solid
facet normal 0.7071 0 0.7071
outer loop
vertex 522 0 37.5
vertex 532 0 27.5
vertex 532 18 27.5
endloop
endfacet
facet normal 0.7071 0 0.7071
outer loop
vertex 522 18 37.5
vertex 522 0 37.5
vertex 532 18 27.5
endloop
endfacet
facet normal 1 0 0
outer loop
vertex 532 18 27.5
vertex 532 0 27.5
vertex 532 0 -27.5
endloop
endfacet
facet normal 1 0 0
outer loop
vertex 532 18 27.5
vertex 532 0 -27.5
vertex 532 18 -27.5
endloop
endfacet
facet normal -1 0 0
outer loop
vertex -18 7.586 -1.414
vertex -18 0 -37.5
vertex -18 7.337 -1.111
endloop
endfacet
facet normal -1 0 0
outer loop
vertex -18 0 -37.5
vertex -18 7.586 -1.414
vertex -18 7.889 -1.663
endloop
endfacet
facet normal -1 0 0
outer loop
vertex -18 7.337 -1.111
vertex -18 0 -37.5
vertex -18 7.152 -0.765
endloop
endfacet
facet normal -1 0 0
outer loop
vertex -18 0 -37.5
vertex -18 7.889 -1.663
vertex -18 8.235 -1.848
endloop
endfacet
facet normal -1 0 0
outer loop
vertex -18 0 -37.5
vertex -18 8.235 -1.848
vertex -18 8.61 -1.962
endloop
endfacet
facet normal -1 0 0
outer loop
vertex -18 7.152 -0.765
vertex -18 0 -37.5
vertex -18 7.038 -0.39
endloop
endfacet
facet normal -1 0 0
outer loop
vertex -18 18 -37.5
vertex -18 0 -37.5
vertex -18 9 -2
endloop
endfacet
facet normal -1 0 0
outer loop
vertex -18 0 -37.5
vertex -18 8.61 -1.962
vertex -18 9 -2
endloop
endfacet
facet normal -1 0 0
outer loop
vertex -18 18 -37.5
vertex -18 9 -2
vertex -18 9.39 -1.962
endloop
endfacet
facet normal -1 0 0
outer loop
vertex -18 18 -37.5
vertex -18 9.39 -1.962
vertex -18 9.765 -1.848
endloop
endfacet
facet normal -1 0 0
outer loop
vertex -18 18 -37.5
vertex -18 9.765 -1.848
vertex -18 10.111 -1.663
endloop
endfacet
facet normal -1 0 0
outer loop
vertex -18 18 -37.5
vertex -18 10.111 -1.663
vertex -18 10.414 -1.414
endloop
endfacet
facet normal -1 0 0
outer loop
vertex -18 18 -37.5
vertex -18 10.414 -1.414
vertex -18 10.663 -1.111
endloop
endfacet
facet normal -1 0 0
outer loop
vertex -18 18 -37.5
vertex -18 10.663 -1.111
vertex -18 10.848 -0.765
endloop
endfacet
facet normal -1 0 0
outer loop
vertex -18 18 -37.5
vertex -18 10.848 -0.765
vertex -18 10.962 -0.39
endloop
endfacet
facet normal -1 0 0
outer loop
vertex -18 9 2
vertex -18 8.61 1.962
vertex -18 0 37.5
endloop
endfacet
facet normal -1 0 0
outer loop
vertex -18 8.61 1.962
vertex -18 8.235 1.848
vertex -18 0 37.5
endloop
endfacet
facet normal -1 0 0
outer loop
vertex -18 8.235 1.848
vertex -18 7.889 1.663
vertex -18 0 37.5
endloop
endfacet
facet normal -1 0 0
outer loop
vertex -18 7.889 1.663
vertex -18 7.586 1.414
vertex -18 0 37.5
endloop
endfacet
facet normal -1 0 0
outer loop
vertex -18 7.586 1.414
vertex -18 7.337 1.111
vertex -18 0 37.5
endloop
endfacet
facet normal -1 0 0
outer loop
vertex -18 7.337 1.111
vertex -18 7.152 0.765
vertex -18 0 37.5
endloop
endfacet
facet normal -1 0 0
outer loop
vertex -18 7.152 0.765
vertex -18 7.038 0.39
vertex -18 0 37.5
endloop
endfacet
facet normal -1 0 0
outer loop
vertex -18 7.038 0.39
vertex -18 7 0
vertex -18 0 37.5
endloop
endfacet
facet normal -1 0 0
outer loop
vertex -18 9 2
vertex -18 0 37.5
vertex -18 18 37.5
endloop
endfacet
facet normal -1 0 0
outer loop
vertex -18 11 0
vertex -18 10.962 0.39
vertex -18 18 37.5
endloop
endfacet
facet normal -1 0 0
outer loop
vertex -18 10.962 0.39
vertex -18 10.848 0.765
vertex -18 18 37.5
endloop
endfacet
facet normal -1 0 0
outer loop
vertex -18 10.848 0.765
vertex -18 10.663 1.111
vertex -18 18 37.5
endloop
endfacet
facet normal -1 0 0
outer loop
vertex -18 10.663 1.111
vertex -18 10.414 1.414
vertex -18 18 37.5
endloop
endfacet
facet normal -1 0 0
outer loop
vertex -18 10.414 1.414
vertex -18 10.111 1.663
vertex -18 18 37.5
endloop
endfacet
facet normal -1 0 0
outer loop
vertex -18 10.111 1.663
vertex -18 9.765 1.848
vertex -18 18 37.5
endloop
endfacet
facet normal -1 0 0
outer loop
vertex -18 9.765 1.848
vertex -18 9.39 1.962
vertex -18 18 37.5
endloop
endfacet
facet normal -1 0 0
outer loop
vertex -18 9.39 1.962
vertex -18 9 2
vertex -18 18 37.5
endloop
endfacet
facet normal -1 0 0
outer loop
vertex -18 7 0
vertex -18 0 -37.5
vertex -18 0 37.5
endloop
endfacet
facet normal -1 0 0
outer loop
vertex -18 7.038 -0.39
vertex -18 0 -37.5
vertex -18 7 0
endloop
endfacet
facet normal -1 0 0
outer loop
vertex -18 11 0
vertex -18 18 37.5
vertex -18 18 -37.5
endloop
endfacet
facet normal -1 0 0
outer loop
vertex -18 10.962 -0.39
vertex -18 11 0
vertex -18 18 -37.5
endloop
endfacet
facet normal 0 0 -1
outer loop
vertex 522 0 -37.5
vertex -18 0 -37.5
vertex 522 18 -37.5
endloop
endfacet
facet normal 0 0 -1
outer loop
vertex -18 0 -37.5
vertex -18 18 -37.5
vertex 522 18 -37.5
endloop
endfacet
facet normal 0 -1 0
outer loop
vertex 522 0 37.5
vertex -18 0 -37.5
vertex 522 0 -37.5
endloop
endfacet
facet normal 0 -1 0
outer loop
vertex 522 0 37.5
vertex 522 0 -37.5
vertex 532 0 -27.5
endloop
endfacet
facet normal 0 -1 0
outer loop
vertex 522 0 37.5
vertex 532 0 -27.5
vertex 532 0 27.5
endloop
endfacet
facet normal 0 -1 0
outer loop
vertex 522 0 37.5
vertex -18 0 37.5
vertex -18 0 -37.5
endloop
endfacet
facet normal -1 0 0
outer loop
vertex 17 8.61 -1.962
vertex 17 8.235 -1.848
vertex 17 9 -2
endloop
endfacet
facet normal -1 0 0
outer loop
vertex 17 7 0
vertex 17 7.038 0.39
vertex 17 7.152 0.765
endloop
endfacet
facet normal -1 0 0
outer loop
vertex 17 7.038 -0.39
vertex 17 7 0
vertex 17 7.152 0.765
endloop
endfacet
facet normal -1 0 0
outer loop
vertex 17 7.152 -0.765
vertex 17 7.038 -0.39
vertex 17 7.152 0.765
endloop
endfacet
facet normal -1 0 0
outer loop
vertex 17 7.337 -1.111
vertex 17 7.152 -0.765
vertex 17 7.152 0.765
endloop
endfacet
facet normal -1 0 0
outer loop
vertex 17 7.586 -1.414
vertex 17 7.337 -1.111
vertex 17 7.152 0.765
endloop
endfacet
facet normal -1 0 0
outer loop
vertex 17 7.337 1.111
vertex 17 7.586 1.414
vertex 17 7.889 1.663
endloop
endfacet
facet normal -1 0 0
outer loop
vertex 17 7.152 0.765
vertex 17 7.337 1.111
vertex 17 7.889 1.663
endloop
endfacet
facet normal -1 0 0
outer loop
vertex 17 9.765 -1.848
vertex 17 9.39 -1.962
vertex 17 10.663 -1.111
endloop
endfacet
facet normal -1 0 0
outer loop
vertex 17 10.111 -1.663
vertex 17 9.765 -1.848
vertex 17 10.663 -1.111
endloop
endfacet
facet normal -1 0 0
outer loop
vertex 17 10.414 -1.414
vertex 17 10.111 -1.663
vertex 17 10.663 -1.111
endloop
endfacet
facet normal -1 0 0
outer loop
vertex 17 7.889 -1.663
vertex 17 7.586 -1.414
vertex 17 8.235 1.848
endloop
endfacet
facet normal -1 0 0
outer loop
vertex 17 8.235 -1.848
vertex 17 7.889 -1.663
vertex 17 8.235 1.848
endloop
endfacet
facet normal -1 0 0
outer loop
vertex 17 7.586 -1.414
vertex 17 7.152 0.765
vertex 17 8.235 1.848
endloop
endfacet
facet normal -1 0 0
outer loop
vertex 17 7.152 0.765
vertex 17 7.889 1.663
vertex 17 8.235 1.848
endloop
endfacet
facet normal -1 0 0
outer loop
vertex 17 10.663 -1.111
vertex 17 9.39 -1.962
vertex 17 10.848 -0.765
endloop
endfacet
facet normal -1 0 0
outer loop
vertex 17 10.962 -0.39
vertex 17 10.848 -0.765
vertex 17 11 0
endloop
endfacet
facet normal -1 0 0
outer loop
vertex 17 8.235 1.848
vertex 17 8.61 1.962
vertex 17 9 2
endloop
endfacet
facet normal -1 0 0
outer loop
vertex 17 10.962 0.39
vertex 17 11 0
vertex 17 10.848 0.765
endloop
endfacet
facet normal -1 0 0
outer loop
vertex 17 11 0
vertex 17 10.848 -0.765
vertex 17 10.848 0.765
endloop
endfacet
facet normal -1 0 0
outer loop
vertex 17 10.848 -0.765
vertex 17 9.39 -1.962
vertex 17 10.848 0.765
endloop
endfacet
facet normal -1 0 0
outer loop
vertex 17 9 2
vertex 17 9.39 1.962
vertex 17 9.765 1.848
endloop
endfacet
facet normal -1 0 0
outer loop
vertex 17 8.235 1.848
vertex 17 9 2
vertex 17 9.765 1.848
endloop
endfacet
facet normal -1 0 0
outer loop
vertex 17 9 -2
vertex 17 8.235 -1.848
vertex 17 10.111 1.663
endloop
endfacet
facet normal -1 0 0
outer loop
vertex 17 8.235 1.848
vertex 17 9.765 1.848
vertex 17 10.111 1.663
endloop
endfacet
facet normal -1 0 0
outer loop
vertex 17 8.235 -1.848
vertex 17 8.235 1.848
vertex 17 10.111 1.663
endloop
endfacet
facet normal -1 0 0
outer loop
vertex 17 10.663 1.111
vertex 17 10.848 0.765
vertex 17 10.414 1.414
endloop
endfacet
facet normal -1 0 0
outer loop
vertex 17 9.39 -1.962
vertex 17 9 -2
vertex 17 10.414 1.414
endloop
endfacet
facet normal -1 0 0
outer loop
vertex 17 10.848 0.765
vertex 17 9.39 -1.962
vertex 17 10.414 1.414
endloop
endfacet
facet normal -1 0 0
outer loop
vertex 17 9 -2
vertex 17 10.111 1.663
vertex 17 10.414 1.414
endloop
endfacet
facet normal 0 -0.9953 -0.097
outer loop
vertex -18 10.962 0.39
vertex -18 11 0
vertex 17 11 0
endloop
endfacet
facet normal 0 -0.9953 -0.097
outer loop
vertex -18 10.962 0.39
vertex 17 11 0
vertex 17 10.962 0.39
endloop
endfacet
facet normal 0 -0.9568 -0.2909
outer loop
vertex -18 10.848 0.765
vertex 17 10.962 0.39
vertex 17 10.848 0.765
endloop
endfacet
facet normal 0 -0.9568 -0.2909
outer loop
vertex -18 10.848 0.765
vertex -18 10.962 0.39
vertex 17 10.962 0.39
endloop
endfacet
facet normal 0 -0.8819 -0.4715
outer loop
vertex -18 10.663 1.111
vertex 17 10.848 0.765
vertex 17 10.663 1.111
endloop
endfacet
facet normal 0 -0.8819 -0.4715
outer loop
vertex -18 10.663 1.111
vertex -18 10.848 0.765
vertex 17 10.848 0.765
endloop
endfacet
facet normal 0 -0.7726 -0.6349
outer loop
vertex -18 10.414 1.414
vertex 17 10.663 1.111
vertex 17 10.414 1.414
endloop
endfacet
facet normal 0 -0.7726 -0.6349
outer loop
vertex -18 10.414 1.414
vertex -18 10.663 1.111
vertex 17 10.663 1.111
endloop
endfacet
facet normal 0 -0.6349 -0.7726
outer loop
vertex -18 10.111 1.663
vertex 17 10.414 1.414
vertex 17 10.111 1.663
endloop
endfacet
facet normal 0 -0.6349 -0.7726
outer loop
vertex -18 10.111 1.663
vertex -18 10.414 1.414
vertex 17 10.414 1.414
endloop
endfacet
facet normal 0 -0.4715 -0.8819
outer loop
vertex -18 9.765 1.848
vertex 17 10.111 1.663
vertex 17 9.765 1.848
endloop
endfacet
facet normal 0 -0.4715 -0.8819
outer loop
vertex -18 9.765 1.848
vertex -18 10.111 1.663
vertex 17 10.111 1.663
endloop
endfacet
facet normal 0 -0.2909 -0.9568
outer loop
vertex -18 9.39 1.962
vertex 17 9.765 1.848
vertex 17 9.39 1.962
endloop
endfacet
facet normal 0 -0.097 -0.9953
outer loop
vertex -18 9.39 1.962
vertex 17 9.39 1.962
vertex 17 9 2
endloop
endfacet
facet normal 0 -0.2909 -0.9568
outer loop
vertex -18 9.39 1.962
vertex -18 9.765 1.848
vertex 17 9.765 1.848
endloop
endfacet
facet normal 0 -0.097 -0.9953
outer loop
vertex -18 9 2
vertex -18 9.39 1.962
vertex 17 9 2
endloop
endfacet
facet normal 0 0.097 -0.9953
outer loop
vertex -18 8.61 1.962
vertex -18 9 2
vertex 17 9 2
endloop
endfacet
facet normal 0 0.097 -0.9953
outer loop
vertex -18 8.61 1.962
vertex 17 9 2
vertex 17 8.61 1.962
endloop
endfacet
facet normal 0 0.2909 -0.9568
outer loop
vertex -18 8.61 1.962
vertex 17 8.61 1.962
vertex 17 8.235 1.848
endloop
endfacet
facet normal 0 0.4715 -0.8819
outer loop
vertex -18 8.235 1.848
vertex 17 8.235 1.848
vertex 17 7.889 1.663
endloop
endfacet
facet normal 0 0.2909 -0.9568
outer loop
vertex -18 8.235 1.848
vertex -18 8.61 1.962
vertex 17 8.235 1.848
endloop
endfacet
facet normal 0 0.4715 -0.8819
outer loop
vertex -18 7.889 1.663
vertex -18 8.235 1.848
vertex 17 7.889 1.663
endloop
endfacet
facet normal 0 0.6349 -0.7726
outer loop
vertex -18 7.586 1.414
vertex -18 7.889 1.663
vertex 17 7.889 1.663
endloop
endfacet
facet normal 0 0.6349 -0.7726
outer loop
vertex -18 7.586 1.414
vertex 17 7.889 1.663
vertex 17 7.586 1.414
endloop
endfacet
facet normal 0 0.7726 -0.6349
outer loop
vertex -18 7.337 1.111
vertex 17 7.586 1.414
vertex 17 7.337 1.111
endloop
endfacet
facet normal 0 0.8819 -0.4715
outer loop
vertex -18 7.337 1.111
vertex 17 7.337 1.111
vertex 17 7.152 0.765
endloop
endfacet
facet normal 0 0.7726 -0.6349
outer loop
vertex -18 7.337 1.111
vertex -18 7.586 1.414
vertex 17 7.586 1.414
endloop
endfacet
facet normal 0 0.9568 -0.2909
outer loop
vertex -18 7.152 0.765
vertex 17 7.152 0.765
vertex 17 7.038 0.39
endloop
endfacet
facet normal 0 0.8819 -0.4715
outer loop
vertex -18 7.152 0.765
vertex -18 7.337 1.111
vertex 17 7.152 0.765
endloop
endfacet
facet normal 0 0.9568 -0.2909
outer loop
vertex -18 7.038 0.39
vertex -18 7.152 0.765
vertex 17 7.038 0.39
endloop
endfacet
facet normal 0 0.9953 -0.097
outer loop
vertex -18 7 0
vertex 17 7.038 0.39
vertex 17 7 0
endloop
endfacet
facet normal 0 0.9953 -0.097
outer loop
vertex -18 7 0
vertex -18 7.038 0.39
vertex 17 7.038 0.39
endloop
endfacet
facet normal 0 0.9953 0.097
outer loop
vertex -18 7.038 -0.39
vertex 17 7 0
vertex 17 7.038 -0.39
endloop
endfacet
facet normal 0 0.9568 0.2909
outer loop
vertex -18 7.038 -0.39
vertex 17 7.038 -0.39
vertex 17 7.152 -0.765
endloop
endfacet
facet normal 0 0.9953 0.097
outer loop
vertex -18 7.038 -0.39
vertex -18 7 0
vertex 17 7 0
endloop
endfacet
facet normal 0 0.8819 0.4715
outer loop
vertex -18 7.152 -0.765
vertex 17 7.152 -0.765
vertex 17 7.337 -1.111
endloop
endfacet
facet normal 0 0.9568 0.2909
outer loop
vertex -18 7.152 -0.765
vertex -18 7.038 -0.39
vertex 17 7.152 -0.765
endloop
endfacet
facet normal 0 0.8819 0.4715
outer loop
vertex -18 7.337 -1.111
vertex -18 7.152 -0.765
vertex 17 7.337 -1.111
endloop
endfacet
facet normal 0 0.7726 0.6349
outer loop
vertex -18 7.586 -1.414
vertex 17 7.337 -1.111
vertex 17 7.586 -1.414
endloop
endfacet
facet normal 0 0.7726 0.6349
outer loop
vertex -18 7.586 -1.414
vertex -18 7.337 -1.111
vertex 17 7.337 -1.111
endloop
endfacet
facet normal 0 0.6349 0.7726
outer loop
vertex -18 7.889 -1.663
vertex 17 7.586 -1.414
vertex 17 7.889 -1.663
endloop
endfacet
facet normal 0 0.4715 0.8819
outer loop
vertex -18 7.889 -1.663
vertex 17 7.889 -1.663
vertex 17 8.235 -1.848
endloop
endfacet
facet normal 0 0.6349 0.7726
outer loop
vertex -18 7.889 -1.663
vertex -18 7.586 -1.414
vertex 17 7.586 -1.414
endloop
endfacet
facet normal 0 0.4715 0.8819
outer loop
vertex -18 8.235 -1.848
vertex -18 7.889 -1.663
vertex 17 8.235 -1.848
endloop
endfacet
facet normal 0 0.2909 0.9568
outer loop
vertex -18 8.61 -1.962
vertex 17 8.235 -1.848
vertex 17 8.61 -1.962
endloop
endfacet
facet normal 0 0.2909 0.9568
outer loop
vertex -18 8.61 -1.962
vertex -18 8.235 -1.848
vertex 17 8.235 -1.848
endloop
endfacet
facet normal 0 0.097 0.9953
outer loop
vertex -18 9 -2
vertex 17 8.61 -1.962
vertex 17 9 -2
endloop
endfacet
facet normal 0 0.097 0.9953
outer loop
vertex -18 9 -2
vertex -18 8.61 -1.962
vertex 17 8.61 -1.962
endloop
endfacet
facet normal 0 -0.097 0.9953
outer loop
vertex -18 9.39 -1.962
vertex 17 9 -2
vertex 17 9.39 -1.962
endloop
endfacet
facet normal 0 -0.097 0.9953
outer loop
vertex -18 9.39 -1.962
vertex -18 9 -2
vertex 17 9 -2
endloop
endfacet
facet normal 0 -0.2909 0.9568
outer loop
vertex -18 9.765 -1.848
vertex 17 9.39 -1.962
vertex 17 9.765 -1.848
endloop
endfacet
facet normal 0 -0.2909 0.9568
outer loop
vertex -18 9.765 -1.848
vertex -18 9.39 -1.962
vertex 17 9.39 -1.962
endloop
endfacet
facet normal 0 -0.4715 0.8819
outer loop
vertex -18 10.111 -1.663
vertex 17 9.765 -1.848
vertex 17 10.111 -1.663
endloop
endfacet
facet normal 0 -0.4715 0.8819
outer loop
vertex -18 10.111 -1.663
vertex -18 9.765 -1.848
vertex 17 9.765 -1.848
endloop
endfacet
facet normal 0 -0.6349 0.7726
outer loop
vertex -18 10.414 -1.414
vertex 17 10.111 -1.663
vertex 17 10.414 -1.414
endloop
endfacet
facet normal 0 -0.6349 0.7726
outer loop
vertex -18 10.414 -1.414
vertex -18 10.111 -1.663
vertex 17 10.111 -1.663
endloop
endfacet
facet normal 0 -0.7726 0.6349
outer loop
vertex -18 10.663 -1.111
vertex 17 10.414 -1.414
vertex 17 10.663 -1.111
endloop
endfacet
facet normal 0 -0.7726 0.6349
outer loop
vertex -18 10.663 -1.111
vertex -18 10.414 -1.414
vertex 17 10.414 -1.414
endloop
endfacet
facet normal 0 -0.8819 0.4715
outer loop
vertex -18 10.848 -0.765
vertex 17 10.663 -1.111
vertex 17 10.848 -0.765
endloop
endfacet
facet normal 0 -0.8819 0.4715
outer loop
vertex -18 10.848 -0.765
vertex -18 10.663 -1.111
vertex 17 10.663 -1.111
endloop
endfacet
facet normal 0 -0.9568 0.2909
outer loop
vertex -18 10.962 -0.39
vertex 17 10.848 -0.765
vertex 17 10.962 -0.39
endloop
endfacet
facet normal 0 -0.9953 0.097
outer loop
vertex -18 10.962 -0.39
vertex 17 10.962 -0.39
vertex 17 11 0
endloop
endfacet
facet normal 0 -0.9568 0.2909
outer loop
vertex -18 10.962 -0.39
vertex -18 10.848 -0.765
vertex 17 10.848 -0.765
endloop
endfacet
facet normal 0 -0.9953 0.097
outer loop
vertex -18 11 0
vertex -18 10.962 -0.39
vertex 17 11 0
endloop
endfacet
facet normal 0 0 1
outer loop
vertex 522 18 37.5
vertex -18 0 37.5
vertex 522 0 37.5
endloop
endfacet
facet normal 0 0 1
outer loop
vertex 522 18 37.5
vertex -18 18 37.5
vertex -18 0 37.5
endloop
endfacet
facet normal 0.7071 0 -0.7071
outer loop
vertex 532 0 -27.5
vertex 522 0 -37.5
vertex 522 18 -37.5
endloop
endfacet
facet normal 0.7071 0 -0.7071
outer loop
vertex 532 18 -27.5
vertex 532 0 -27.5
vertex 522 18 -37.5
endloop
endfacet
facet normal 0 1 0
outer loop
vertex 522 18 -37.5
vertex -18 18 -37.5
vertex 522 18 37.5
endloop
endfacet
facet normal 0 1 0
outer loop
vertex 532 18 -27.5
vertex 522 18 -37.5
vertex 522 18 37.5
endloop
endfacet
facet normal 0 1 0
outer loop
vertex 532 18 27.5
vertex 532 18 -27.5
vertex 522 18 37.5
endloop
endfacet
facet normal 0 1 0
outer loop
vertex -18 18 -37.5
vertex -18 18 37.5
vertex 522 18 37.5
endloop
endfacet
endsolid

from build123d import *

# Parameters (mm, degrees)
SKETCH1_W           = 550
SKETCH1_H           = 18
BOSS_EXTRUDE1_DEPTH = 37.5
CHAMFER1_SIZE       = 10
SKETCH3_R           = 2
CUT_EXTRUDE1_DEPTH  = 35


with BuildPart() as part:
    # Sketch1 → Boss-Extrude1 (new, symmetric)
    with BuildSketch(Plane.XY):
        with Locations((257, 9)):
            Rectangle(SKETCH1_W, SKETCH1_H)
    extrude(amount=BOSS_EXTRUDE1_DEPTH, both=True)

    # Chamfer1
    chamfer1_edges = [part.edges().sort_by_distance(p)[0] for p in [
        (532, 9, 37.5),
        (532, 9, -37.5),
    ]]
    chamfer(chamfer1_edges, length=CHAMFER1_SIZE)

    # Sketch3 → Cut-Extrude1 (cut)
    with BuildSketch(Plane(origin=(-18, 0, 0), x_dir=(0, 0, -1), z_dir=(1, 0, 0))):
        with Locations(Location((0, 9, 0), (0, 0, 90))):
            Circle(SKETCH3_R)
    extrude(amount=CUT_EXTRUDE1_DEPTH, mode=Mode.SUBTRACT)


solid = part.part
